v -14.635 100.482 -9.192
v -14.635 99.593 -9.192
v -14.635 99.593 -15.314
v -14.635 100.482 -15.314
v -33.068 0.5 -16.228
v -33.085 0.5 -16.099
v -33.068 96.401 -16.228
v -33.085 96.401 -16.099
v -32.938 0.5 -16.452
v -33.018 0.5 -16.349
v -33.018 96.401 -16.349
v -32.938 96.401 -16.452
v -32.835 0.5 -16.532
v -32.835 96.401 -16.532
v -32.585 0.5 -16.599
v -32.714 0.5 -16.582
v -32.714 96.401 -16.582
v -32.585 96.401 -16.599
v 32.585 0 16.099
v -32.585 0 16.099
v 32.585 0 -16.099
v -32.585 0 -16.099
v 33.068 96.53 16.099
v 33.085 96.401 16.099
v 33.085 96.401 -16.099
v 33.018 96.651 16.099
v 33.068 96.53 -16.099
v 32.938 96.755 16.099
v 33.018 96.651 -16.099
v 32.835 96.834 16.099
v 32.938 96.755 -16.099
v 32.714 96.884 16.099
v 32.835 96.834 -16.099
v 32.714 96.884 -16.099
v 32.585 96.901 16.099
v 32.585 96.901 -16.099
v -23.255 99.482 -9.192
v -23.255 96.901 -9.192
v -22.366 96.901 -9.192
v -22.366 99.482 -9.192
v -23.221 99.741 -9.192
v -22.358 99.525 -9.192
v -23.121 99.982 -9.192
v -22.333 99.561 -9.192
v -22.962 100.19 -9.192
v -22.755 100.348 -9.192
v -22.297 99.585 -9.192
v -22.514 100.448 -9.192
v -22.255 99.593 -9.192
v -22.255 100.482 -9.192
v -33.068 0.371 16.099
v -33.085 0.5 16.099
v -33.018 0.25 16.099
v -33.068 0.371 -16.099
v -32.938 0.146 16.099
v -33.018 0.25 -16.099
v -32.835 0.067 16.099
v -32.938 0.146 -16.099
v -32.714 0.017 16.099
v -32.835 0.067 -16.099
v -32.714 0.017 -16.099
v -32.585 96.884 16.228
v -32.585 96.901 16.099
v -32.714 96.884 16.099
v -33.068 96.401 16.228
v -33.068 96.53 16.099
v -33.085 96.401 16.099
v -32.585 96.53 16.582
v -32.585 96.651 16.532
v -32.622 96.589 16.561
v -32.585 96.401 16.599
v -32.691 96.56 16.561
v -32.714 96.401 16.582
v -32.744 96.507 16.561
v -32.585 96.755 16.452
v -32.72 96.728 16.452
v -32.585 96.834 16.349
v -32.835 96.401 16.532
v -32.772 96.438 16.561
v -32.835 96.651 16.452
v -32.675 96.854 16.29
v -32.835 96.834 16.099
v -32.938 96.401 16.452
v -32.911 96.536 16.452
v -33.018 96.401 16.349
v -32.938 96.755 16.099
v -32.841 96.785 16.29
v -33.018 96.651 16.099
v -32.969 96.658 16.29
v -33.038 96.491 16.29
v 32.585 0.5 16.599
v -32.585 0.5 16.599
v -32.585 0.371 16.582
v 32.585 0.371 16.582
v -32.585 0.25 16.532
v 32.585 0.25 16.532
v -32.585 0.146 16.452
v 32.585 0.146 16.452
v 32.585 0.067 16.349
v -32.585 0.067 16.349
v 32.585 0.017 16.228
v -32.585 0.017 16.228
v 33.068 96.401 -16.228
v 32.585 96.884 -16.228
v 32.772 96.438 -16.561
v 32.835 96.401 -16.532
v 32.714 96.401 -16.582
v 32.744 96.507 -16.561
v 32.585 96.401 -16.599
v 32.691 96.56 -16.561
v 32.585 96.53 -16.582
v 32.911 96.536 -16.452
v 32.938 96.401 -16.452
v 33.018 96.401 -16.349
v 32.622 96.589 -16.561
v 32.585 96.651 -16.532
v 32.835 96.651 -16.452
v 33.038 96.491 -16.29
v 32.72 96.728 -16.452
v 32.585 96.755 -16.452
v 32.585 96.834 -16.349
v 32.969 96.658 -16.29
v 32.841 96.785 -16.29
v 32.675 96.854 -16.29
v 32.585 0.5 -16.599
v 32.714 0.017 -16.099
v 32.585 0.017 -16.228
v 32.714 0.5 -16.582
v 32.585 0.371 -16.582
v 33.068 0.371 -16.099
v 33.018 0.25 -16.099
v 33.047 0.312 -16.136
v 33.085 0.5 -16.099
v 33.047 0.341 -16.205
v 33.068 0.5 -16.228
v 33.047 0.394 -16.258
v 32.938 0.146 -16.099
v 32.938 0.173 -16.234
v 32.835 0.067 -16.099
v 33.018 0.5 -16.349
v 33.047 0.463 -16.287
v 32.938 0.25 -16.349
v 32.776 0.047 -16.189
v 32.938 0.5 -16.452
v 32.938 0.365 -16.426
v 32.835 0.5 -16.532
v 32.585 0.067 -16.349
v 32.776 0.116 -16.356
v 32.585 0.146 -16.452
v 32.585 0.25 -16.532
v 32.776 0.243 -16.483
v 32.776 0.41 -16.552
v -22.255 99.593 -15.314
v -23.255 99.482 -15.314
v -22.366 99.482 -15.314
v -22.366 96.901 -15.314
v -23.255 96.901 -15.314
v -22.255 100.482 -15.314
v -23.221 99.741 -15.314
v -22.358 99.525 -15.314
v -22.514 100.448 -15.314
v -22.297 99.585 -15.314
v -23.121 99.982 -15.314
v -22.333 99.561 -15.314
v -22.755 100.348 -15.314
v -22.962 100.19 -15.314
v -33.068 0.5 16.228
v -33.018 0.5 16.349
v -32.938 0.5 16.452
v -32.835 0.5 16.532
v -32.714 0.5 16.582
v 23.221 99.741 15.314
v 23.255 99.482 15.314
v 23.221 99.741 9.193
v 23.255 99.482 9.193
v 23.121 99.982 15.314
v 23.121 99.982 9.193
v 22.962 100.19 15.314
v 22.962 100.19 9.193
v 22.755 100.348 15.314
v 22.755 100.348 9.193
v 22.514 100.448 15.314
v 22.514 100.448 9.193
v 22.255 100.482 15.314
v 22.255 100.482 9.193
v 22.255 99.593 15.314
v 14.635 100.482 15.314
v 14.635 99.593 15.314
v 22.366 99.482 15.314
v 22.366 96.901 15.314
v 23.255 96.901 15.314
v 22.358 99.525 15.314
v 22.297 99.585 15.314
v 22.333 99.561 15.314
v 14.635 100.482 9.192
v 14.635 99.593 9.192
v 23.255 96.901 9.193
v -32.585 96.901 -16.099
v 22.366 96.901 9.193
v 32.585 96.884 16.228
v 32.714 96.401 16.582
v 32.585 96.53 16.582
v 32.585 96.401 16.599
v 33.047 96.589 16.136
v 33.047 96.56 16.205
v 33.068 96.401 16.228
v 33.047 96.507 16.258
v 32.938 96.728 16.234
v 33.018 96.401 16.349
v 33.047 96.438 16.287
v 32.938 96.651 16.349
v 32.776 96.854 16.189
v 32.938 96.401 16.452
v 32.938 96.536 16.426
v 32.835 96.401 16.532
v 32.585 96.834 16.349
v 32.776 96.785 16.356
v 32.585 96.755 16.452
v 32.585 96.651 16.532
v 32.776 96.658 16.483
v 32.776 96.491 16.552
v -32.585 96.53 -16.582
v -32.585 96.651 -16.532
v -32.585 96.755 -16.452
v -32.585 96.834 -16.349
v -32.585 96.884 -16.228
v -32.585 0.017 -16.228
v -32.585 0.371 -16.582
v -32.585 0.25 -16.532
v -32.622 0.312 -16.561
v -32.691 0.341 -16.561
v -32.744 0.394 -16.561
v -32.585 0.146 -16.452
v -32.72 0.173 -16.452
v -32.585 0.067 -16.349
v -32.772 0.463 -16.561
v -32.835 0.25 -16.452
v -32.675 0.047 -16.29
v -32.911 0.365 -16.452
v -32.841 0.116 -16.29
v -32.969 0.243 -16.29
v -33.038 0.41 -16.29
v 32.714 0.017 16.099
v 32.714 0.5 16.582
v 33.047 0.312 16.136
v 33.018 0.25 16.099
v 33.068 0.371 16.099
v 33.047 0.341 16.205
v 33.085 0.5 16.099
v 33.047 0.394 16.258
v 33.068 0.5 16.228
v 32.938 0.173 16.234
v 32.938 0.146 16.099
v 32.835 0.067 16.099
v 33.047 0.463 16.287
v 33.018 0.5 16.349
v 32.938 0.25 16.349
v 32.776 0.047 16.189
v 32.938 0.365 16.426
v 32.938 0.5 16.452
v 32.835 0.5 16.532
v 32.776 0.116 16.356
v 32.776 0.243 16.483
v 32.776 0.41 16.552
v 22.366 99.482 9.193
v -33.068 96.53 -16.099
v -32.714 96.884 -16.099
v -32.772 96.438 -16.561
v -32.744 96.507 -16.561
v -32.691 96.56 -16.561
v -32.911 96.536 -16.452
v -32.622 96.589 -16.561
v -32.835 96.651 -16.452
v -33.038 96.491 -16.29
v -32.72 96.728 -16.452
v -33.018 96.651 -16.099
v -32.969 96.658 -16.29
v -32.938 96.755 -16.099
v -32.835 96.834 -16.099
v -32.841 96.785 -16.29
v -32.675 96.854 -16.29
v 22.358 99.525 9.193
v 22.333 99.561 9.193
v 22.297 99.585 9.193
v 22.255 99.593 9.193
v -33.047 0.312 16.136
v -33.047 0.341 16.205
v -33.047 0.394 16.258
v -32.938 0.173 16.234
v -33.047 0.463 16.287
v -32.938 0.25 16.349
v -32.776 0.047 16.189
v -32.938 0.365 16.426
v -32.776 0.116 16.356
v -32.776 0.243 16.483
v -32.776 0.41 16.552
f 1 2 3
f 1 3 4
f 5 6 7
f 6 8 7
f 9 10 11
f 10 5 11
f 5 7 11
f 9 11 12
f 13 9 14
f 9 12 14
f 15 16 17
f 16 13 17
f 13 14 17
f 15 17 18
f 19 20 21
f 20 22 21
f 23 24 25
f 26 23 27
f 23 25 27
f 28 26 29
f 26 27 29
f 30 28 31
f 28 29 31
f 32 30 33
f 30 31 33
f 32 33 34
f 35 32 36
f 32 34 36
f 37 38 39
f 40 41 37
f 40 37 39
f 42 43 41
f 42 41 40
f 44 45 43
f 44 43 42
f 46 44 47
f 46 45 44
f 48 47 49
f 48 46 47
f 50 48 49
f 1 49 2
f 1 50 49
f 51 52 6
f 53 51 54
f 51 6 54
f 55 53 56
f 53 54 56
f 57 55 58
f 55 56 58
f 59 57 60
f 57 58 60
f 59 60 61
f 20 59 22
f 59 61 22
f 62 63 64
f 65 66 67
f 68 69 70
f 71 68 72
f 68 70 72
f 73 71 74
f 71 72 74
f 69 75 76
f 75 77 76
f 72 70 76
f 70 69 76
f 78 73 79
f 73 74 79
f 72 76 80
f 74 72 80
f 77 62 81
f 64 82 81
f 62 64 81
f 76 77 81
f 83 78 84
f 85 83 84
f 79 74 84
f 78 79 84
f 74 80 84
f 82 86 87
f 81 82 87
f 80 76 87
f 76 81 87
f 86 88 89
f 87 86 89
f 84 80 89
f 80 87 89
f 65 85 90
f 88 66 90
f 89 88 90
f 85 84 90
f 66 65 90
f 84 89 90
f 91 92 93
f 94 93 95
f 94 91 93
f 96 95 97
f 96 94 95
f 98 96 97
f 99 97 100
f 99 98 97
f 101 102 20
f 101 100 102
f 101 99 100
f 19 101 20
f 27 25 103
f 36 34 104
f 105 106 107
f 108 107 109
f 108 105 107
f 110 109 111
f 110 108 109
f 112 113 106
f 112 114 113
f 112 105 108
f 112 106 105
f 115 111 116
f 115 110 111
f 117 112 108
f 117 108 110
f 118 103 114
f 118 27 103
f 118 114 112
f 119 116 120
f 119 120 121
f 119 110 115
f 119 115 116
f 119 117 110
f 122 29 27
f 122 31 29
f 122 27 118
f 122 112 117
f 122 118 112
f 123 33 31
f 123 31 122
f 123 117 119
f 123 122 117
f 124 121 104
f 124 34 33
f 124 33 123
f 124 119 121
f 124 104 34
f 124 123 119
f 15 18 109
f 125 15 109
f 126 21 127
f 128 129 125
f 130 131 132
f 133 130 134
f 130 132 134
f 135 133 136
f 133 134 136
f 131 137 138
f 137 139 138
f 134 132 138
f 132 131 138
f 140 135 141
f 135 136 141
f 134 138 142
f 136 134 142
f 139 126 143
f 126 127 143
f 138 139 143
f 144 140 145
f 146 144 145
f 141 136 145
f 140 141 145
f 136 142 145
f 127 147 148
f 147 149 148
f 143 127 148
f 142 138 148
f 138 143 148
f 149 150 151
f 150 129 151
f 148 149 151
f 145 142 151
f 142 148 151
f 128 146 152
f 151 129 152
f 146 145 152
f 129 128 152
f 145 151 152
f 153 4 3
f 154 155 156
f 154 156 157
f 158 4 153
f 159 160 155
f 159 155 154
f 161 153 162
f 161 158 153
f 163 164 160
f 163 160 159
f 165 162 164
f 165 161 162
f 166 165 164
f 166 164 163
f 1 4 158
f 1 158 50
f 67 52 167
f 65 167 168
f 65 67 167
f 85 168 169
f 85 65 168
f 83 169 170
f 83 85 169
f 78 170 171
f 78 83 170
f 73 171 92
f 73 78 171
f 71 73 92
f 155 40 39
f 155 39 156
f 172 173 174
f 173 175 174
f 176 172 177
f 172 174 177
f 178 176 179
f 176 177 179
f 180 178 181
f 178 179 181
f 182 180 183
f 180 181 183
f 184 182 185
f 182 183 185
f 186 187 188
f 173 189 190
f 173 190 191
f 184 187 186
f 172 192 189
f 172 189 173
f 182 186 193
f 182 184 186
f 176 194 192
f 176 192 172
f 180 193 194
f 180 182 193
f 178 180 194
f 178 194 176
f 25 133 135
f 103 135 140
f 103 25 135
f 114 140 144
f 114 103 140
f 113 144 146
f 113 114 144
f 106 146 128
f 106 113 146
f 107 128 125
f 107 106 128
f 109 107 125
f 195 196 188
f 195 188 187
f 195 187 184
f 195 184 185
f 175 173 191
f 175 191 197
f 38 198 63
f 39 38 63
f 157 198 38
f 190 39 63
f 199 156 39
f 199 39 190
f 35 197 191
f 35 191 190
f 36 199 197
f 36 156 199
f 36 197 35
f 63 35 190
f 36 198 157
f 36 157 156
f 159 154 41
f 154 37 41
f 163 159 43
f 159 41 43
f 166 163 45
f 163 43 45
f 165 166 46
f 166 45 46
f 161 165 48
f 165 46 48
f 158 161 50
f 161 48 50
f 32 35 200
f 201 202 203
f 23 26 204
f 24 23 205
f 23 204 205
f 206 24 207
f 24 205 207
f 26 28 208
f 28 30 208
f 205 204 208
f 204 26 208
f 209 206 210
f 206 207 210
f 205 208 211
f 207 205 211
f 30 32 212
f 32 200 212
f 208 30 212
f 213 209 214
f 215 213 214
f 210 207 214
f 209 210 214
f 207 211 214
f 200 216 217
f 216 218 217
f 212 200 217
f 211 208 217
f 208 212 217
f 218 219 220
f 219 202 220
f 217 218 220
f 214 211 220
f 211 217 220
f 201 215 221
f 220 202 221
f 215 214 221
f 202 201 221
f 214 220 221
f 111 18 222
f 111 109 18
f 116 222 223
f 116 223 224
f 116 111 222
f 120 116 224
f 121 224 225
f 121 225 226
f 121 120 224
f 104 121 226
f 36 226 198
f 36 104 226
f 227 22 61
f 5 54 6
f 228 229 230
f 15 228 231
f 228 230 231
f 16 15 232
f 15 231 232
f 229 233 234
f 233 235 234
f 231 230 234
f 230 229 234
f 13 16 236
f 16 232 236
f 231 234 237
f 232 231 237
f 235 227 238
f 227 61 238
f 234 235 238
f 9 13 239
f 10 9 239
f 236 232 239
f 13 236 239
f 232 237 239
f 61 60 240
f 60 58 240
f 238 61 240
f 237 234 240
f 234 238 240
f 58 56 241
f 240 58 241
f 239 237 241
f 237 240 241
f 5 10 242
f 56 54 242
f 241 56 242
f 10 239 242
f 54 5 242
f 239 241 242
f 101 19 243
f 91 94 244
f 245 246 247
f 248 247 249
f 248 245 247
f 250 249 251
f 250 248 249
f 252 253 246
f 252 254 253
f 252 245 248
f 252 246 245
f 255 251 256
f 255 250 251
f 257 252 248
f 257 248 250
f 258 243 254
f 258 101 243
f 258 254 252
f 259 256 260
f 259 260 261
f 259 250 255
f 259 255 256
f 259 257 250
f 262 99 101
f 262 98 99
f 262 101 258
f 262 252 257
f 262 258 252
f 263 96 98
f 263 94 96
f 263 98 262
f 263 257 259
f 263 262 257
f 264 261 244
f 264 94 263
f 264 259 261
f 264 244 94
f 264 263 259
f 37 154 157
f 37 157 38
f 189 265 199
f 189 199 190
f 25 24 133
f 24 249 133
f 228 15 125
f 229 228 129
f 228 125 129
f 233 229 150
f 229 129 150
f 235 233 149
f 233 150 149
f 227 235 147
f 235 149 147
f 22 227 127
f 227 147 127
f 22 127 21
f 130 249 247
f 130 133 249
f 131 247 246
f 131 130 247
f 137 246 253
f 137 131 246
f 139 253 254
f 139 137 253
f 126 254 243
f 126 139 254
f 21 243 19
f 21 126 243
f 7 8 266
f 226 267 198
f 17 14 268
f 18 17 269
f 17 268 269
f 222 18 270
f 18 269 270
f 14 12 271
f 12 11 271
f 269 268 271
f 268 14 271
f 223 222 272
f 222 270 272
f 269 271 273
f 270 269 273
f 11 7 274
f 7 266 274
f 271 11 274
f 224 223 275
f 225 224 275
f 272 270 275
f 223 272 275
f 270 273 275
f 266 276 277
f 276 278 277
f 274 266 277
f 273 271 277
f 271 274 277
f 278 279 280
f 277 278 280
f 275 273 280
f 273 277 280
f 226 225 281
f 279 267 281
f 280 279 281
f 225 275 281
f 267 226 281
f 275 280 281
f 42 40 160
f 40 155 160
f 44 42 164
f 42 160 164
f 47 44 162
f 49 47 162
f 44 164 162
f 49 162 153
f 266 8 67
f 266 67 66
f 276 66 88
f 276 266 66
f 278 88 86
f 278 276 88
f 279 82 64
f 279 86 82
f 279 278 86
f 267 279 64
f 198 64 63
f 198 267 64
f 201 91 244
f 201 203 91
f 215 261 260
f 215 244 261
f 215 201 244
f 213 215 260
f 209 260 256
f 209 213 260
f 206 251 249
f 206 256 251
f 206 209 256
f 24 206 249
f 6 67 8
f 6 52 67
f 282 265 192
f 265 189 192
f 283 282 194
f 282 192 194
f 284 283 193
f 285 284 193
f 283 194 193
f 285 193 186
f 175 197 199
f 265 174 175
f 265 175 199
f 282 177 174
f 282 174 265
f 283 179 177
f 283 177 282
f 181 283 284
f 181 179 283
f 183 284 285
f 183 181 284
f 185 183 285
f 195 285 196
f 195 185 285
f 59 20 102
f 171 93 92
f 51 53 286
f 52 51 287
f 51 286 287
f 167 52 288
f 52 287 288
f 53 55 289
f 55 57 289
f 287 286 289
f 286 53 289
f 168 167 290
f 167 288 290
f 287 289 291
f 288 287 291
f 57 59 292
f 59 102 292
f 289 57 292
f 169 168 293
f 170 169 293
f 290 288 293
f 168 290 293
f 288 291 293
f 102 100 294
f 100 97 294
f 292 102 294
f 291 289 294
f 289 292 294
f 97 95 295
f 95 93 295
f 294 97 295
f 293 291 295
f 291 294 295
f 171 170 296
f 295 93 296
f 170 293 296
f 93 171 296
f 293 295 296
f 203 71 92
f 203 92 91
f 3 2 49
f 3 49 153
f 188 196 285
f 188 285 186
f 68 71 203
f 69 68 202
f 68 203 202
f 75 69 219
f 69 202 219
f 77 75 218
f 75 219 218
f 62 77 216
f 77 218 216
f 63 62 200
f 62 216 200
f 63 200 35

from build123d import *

# Parameters (mm, degrees)
SKETCH2_W           = 66.16954
SKETCH2_H           = 33.1978
BOSS_EXTRUDE1_DEPTH = 96.901
FILLET1_R           = 0.5
SKETCH3_W           = 0.889
SKETCH3_H           = 6.1214
CIRPATTERN1_COUNT   = 2


with BuildPart() as part:
    # Sketch2 → Boss-Extrude1 (new body)
    with BuildSketch(Plane(origin=(0, 0, 0), x_dir=(1, 0, 0), z_dir=(0, 1, 0))):
        Rectangle(SKETCH2_W, SKETCH2_H)
    extrude(amount=BOSS_EXTRUDE1_DEPTH)

    # Fillet1
    fillet1_edges = [part.edges().sort_by_distance(p)[0] for p in [
        (33.08477, 48.4505, 16.5989),
        (-33.08477, 48.4505, 16.5989),
        (-33.08477, 0, 0),
        (0, 0, 16.5989),
        (33.08477, 0, 0),
        (33.08477, 48.4505, -16.5989),
        (-33.08477, 48.4505, -16.5989),
        (0, 0, -16.5989),
        (0, 96.901, 16.5989),
        (-33.08477, 96.901, 0),
        (0, 96.901, -16.5989),
        (33.08477, 96.901, 0),
    ]]
    fillet(fillet1_edges, radius=FILLET1_R)

    # Sweep1: sweep along a path in Sketch4
    with BuildLine(Plane(origin=(0, 0, -16.5989), x_dir=(-1, 0, 0), z_dir=(0, 0, -1))) as sweep1_path:
        Line((23.25497, 96.901), (23.25497, 99.4824))
        ThreePointArc((23.25497, 99.4824), (22.962076781, 100.189506781), (22.25497, 100.4824))
        Line((22.25497, 100.4824), (14.63497, 100.4824))
    # Sketch3 → Sweep1 (sweep)
    with BuildSketch(Plane(origin=(0, 96.901, 0), x_dir=(1, 0, 0), z_dir=(0, 1, 0))):
        with Locations((-22.81047, 12.2532)):
            Rectangle(SKETCH3_W, SKETCH3_H)
    sweep1 = sweep(path=sweep1_path.line)

    # CirPattern1: Sweep1 ×2 about axis
    cirpattern1_axis = Axis((0, -5.02412, 0), (0, 1, 0))
    for i in range(1, CIRPATTERN1_COUNT):
        add(sweep1.rotate(cirpattern1_axis, i * 360 / CIRPATTERN1_COUNT))


solid = part.part
